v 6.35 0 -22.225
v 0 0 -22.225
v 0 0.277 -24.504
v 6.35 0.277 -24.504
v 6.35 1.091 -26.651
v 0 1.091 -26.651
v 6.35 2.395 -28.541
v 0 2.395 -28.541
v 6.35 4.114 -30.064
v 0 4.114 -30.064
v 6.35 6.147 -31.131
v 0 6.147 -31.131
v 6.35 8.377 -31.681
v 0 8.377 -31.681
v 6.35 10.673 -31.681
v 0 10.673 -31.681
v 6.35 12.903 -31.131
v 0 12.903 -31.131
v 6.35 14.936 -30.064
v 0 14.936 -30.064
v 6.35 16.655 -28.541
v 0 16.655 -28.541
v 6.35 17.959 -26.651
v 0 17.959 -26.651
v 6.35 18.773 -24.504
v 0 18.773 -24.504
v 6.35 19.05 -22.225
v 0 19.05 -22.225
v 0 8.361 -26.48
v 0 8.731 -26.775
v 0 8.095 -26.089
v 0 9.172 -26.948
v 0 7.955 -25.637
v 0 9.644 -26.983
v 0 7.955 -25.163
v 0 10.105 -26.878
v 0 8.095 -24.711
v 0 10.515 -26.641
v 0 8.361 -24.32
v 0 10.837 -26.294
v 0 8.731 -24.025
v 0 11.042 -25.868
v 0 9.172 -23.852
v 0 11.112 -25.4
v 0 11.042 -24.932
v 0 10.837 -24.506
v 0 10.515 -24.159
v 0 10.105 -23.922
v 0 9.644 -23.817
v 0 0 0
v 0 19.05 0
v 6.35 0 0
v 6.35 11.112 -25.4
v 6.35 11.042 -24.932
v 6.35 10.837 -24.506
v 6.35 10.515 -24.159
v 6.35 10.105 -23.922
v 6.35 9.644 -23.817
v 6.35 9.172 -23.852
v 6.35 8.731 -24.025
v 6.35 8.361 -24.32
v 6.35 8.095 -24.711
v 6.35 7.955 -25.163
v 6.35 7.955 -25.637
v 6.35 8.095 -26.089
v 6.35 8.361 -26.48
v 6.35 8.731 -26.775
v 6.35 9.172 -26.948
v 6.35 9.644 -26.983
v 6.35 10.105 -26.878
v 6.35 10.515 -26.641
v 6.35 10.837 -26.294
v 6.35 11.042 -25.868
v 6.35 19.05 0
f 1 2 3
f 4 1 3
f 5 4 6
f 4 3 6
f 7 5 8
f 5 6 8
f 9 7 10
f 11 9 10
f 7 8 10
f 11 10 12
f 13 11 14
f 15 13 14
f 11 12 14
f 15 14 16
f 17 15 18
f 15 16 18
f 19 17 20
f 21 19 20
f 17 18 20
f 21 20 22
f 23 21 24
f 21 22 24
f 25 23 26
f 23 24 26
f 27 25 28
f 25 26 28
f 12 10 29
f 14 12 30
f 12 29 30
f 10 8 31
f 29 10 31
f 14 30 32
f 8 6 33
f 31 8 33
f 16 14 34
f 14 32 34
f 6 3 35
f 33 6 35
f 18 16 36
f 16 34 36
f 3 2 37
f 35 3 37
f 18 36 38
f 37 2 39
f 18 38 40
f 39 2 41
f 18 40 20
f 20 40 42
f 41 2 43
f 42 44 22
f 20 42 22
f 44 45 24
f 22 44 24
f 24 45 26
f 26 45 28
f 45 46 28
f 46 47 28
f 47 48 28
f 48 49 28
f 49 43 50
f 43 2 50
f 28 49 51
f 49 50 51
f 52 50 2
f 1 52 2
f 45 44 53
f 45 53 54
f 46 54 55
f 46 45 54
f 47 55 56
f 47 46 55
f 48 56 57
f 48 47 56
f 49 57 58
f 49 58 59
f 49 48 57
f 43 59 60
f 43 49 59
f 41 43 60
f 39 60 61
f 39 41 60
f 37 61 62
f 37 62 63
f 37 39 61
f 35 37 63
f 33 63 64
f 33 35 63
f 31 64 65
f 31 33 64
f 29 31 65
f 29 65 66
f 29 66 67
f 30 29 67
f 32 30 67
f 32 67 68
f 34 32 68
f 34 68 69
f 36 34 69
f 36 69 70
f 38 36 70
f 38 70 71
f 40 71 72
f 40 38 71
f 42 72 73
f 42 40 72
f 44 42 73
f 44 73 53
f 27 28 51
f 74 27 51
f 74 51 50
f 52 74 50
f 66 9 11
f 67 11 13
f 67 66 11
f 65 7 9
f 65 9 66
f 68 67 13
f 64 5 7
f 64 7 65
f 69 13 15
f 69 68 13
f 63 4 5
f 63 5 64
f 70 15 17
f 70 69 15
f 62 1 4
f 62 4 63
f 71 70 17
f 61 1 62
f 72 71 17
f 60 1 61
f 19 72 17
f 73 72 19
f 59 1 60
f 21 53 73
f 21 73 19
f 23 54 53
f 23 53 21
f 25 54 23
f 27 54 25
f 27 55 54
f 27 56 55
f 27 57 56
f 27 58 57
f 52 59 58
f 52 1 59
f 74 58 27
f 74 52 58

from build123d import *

# Parameters (mm, degrees)
F0_R     = 1.5875
F1_DEPTH = 6.35


with BuildPart() as f1:
    # F0 (on Right) → F1 (new body)
    with BuildSketch(Plane.YZ):
        with BuildLine():
            Line((0, 0), (0, -22.225))
            ThreePointArc((0, -22.225), (9.525, -31.75), (19.05, -22.225))
            Line((19.05, -22.225), (19.05, 0))
            Line((19.05, 0), (0, 0))
        make_face()
        with Locations((9.525, -25.4)):
            Circle(F0_R, mode=Mode.SUBTRACT)
    extrude(amount=F1_DEPTH)


solid = f1.part
